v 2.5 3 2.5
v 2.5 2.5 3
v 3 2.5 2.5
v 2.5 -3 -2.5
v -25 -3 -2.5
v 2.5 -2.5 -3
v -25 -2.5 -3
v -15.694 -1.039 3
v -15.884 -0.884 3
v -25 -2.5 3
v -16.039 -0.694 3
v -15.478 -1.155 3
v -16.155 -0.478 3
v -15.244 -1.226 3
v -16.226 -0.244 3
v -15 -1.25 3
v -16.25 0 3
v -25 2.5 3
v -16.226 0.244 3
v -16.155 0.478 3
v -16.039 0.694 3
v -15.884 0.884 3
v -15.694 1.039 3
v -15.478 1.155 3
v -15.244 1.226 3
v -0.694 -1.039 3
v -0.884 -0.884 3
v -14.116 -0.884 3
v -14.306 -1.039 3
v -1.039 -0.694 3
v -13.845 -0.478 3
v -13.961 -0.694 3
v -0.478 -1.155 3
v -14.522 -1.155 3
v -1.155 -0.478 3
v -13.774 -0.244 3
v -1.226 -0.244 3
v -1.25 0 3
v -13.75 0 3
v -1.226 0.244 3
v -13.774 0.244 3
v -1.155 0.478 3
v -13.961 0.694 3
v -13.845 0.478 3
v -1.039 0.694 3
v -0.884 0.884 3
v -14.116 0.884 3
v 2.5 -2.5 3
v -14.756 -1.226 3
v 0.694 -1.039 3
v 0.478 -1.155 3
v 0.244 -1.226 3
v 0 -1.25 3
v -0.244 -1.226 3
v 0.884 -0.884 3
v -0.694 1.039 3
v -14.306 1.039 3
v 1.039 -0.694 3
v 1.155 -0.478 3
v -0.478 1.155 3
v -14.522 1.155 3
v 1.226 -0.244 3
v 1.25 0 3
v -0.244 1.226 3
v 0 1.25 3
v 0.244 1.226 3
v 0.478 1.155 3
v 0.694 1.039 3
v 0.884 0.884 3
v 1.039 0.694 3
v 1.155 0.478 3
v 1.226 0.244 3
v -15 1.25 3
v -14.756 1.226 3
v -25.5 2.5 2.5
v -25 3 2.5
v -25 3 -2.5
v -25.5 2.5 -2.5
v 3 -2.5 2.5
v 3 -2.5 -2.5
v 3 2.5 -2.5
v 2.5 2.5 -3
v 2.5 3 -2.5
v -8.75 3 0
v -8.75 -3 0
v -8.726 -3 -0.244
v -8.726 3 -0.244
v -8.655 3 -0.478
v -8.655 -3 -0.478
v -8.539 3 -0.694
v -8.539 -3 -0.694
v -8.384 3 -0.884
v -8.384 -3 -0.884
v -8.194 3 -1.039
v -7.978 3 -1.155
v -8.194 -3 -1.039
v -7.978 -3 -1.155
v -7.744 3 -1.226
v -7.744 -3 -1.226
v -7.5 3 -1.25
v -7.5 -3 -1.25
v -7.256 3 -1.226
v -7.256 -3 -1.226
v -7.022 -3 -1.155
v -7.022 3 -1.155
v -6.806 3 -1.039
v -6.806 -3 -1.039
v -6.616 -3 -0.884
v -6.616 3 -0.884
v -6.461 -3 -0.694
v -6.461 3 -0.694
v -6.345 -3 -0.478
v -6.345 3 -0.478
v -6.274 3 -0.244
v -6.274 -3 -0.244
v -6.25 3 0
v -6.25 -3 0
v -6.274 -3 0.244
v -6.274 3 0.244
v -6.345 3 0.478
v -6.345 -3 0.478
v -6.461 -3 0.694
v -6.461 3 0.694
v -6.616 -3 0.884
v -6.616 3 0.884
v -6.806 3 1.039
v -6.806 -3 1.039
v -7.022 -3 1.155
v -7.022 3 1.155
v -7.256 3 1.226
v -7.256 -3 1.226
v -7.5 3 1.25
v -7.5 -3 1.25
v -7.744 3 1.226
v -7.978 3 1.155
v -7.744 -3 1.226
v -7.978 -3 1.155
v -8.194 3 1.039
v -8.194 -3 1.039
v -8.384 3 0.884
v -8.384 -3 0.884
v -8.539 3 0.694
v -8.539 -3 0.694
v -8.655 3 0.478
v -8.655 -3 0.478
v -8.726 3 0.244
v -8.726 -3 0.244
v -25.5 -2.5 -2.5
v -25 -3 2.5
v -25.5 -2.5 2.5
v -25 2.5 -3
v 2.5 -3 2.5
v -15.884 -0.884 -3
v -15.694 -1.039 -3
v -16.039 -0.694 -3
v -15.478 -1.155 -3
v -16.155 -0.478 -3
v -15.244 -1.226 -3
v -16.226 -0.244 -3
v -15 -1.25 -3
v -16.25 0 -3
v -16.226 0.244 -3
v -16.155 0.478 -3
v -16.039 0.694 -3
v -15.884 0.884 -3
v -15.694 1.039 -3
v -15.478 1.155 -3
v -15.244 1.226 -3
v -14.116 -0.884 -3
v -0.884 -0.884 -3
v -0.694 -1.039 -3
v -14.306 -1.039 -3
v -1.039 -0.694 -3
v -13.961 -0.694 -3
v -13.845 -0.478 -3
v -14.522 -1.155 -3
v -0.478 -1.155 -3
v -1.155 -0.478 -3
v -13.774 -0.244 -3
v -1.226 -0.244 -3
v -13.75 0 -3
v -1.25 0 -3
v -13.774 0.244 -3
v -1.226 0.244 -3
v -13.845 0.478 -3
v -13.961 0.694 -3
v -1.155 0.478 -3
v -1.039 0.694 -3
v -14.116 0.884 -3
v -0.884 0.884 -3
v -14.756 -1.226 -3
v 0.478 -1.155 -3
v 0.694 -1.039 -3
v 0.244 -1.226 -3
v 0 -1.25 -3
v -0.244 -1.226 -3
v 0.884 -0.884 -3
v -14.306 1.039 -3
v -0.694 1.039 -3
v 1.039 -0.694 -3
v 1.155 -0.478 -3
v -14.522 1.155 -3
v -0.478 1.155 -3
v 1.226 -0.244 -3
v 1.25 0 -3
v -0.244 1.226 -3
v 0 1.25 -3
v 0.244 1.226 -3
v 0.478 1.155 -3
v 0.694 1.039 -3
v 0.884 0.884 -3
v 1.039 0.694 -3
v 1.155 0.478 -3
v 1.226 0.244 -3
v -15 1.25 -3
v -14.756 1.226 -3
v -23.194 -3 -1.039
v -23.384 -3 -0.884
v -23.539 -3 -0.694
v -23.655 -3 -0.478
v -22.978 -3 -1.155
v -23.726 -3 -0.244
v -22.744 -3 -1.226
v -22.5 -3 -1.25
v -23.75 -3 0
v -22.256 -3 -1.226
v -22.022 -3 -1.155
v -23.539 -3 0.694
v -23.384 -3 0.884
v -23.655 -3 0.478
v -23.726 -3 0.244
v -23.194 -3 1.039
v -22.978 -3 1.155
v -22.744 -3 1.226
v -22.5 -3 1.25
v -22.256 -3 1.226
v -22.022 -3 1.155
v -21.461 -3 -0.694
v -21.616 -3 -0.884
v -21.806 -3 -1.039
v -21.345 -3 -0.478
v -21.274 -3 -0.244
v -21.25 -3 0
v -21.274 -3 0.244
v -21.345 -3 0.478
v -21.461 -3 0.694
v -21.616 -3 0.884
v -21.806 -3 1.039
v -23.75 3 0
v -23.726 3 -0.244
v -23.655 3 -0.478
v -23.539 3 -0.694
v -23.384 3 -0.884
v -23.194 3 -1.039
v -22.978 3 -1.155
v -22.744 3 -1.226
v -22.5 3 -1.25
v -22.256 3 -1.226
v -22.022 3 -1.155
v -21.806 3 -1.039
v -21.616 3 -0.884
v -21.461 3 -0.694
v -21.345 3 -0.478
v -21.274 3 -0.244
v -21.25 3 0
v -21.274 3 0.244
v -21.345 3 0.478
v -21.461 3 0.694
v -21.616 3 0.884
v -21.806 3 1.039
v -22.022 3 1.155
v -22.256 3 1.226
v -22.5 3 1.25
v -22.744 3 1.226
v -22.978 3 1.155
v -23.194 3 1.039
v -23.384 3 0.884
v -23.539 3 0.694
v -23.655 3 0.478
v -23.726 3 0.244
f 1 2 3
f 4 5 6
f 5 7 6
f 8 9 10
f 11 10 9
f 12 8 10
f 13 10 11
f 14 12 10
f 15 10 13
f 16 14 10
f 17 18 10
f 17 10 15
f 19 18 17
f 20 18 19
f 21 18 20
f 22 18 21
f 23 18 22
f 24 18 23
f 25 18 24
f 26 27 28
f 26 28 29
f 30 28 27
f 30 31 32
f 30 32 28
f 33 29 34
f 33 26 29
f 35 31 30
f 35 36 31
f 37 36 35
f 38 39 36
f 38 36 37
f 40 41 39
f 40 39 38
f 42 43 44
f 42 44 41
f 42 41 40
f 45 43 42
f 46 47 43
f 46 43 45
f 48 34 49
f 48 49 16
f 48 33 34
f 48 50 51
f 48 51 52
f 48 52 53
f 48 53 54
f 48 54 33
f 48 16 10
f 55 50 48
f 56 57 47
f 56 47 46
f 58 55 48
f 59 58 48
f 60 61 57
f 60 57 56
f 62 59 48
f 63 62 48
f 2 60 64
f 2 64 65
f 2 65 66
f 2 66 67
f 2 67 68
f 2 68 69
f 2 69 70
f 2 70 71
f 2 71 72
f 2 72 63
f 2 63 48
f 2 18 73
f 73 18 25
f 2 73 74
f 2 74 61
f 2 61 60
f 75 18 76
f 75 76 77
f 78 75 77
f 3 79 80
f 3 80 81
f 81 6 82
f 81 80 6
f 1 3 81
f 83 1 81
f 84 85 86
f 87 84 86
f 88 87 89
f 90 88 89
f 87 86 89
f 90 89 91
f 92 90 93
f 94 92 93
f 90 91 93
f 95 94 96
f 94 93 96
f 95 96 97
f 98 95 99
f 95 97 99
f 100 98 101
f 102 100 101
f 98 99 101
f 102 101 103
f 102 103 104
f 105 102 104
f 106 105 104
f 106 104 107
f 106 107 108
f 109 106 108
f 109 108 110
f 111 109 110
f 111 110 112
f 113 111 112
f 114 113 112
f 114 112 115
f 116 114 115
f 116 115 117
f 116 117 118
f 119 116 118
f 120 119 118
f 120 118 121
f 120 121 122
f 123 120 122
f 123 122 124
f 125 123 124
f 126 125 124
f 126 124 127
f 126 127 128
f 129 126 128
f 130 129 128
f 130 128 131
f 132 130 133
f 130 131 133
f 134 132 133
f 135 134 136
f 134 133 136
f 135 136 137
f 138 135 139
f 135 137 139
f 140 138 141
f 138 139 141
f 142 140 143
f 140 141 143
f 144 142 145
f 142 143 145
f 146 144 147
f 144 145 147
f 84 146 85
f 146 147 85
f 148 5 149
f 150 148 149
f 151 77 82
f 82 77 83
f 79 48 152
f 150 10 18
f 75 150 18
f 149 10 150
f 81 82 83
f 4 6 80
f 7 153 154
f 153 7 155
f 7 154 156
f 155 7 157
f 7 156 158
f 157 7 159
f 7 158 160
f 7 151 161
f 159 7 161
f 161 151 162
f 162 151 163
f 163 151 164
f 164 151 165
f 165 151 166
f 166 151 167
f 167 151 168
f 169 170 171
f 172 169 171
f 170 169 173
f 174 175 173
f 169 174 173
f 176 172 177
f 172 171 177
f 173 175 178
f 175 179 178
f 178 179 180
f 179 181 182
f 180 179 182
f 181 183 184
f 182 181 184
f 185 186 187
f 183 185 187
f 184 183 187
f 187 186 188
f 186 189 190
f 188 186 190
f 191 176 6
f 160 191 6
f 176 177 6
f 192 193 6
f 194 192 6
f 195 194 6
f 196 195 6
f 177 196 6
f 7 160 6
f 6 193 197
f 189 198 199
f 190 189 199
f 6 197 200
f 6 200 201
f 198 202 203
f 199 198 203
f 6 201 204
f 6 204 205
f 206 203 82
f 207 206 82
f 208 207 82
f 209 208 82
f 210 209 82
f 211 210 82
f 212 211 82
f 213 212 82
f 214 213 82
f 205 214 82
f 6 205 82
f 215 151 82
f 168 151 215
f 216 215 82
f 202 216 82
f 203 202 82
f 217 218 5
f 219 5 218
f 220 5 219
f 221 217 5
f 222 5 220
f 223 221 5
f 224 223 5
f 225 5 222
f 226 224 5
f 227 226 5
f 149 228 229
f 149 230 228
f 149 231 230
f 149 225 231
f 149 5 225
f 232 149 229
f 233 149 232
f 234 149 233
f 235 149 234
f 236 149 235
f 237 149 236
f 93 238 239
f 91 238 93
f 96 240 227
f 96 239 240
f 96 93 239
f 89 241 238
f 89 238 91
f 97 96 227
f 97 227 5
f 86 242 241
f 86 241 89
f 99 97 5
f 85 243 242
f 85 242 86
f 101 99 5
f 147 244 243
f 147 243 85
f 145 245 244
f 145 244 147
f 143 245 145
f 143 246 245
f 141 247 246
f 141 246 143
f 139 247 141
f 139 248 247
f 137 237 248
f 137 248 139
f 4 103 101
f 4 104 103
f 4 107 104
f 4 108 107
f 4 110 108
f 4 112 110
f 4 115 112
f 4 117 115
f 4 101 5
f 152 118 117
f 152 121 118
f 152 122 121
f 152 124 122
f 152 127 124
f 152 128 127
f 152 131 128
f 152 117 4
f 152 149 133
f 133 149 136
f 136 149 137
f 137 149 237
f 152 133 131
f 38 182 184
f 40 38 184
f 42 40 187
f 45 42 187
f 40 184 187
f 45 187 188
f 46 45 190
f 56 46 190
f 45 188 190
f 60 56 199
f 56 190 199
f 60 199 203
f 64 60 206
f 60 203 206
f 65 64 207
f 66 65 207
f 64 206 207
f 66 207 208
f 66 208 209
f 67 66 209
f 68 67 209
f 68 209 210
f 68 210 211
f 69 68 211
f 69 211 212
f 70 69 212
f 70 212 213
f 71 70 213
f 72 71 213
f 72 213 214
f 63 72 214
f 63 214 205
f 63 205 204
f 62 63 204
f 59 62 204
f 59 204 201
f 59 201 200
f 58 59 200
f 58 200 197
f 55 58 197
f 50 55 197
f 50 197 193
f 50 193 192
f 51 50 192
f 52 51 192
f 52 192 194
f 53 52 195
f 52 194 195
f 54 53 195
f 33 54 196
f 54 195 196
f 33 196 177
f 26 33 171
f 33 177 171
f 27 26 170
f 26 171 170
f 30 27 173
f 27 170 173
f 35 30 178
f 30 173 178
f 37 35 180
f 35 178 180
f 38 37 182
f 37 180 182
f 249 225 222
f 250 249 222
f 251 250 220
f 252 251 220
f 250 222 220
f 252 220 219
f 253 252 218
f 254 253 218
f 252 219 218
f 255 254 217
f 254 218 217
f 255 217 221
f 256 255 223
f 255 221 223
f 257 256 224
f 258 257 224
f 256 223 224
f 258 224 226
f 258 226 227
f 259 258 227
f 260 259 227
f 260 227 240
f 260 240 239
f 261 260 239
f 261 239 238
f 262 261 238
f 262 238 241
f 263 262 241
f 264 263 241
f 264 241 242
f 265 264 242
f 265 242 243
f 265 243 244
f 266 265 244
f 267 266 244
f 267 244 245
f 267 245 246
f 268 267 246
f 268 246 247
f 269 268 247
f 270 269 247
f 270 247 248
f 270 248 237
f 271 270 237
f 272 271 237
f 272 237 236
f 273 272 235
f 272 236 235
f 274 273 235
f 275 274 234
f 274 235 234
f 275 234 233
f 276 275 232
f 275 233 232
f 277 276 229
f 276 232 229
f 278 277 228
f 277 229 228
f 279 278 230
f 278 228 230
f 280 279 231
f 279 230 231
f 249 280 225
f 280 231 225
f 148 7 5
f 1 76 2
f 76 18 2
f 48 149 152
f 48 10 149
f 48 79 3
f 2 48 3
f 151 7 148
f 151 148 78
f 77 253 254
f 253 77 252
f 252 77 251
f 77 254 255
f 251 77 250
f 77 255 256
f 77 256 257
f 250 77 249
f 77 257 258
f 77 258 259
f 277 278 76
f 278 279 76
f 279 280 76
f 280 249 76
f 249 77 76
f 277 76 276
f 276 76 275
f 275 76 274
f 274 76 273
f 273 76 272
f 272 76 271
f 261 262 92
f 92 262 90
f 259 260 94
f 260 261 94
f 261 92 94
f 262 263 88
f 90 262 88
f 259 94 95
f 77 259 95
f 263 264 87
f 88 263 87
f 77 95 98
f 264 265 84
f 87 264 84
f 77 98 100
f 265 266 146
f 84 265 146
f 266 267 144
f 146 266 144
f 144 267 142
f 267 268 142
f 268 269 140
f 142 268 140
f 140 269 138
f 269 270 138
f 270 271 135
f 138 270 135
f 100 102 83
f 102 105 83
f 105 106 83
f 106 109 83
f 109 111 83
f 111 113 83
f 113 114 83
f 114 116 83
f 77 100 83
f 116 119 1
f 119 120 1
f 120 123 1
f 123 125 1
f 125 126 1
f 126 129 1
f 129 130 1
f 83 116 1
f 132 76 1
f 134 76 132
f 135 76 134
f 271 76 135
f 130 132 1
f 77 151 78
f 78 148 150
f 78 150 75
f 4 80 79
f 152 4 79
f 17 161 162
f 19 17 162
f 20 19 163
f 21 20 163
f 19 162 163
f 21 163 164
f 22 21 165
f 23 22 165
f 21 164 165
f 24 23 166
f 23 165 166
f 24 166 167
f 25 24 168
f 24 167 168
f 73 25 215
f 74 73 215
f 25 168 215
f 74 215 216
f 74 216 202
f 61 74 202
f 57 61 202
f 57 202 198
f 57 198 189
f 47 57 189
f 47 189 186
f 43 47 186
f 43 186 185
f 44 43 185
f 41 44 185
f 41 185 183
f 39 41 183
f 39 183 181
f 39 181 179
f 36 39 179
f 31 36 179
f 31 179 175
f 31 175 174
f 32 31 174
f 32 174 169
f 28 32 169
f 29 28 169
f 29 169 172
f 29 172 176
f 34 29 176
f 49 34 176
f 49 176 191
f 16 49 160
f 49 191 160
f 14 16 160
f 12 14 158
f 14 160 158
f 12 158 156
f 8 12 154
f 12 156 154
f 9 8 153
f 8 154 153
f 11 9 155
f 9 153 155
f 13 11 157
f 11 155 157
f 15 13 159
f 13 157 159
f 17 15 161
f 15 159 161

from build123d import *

# Parameters (mm, degrees)
SKETCH_2_W         = 28.5
SKETCH_2_H         = 6
SKETCH_2_R         = 0.5
EXTRUDE_1_DEPTH    = 3
HOLE_WIZARD_M3_1_D = 2.5
HOLE_WIZARD_M3_2_D = 2.5
CHAMFER_1_SIZE     = 0.5


with BuildPart() as part:
    # 草图2 → 凸台-拉伸1 (new body, symmetric)
    with BuildSketch(Plane.XY):
        with Locations((-11.25, 0)):
            Rectangle(SKETCH_2_W, SKETCH_2_H)
        with Locations((-15, 0)):
            Circle(SKETCH_2_R, mode=Mode.SUBTRACT)
        Circle(SKETCH_2_R, mode=Mode.SUBTRACT)
    extrude(amount=EXTRUDE_1_DEPTH, both=True)

    # M3 螺纹孔1 (through all)
    with Locations(Plane.XY.offset(3)):
        with Locations((0, 0), (-15, 0)):
            Hole(HOLE_WIZARD_M3_1_D / 2)

    # M3 螺纹孔2 (through all)
    with Locations(Plane(origin=(0, 3, 0), x_dir=(1, 0, 0), z_dir=(0, 1, 0))):
        with Locations((-7.5, 0), (-22.5, 0)):
            Hole(HOLE_WIZARD_M3_2_D / 2)

    # 倒角1
    chamfer_1_edges = [part.edges().sort_by_distance(p)[0] for p in [
        (-11.25, -3, 3),
        (3, 0, 3),
        (-11.25, 3, 3),
        (3, 0, -3),
        (-11.25, -3, -3),
        (-25.5, 0, -3),
        (-11.25, 3, -3),
        (-25.5, 0, 3),
        (3, 3, 0),
        (3, -3, 0),
        (-25.5, -3, 0),
        (-25.5, 3, 0),
    ]]
    chamfer(chamfer_1_edges, length=CHAMFER_1_SIZE)


solid = part.part
